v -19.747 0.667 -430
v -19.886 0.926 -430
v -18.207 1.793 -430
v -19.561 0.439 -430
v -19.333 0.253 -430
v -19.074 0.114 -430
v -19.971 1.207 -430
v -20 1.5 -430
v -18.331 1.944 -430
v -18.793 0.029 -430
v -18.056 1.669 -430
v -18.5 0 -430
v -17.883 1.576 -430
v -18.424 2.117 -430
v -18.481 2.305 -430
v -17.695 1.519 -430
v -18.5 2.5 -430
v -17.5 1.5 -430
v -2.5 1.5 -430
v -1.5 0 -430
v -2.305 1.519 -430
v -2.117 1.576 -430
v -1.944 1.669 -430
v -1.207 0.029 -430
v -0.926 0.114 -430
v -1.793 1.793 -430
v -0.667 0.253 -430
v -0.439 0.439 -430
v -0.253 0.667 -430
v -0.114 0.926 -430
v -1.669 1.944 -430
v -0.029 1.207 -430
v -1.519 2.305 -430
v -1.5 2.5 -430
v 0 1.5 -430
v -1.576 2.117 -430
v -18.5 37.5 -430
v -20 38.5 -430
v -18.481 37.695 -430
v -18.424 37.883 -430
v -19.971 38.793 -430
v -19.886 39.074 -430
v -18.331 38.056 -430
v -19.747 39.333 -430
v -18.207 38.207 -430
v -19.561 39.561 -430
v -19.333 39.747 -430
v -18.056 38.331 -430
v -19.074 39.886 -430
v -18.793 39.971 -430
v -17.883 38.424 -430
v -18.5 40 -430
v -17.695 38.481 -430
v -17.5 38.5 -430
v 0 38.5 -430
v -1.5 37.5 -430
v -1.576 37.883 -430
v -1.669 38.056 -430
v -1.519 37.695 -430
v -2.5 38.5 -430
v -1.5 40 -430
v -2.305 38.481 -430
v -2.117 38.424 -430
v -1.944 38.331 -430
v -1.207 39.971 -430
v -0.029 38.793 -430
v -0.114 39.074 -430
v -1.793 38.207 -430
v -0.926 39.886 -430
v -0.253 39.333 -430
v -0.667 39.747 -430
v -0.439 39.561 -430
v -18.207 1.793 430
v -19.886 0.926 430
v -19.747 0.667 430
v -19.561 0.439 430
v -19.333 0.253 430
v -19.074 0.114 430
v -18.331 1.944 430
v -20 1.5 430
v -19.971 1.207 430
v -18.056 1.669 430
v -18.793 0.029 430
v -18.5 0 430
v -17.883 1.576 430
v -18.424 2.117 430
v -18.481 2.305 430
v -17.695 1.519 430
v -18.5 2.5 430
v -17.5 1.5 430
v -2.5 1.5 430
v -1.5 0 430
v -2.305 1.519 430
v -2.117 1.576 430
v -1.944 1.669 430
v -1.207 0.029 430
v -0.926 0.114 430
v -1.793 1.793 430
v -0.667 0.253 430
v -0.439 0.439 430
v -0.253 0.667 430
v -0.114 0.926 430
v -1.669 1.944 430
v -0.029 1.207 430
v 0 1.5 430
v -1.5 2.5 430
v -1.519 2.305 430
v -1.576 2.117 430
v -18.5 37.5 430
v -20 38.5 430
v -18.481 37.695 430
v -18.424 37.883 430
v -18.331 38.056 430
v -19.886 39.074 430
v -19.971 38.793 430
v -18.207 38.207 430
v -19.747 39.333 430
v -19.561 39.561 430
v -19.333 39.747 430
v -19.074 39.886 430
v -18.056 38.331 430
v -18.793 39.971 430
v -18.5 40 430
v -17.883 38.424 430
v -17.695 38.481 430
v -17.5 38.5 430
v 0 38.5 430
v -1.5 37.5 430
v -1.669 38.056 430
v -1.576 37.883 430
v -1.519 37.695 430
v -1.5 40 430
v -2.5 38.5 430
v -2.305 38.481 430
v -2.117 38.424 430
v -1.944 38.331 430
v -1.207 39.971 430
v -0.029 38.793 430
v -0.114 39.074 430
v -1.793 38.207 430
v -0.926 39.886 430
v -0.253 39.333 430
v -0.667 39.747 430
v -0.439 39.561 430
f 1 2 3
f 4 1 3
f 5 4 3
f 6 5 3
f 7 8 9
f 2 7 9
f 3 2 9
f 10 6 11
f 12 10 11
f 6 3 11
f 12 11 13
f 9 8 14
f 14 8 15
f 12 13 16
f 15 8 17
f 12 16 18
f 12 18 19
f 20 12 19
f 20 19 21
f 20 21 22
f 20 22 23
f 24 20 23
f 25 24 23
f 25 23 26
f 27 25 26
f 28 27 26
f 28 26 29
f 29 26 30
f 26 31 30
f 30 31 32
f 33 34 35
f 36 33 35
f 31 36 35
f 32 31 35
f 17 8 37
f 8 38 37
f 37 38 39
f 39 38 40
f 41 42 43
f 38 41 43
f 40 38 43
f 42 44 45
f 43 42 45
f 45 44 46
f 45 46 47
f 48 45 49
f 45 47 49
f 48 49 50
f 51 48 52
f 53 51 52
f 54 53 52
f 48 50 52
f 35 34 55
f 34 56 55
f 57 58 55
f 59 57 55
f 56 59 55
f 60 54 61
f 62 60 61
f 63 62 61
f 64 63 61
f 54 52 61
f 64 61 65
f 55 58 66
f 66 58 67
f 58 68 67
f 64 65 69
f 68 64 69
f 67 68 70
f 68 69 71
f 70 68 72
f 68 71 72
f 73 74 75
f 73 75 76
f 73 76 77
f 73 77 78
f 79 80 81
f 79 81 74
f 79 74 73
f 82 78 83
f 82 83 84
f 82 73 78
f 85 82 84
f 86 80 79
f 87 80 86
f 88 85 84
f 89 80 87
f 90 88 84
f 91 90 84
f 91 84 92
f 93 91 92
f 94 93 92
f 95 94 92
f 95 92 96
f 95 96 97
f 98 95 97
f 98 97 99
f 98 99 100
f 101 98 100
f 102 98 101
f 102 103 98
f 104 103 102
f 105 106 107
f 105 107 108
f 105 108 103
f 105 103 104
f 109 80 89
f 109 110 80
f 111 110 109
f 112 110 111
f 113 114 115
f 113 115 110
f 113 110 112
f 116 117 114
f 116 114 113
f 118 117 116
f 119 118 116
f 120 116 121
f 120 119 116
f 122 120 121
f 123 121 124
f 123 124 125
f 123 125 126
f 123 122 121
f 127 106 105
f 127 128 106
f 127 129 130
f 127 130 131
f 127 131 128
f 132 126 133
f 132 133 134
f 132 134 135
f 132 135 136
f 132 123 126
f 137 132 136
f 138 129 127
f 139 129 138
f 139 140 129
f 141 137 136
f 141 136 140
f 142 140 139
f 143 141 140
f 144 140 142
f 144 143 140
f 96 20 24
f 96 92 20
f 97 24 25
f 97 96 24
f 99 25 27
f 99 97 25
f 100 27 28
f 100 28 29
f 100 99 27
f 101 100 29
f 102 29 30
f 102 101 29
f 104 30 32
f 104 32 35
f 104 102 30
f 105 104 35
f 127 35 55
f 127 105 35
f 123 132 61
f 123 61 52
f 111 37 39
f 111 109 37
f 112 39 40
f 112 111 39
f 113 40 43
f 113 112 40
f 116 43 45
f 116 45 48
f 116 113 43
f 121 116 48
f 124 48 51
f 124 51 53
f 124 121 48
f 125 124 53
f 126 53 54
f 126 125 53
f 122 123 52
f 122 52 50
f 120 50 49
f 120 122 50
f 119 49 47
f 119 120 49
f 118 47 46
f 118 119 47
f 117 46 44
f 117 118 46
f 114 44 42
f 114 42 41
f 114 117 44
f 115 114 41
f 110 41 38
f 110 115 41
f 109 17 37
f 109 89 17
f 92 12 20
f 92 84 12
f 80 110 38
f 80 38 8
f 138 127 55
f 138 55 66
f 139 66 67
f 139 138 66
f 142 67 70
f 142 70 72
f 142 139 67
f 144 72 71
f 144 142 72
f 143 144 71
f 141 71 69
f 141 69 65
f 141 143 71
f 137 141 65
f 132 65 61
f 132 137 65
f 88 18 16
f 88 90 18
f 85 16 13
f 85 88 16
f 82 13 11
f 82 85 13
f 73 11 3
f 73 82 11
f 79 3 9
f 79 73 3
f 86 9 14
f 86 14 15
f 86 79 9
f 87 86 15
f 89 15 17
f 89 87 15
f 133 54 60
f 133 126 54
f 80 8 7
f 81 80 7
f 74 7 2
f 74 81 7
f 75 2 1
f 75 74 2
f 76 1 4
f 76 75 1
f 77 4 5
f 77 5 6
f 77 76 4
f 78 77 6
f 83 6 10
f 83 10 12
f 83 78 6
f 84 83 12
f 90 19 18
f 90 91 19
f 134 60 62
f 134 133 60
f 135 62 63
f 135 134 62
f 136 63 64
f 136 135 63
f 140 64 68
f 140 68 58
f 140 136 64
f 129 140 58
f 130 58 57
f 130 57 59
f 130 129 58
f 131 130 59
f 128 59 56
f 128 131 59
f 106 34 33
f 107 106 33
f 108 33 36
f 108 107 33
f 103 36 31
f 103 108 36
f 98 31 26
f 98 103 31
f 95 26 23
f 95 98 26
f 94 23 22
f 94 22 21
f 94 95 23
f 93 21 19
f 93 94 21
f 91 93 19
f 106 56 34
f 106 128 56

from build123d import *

# Parameters (mm, degrees)
EXTRUDE_1_DEPTH = 430


# Read off the part's stored shape, not the designer's step: Бобышка-Вытянуть1
with BuildPart() as part:
    # Бобышка-Вытянуть1 outline → Бобышка-Вытянуть1 (new body)
    with BuildSketch(Plane.XY):
        with BuildLine():
            Line((0, 1.5), (0, 38.5))
            ThreePointArc((0, 38.5), (-0.439339828, 39.560660172), (-1.5, 40))
            Line((-1.5, 40), (-18.5, 40))
            ThreePointArc((-18.5, 40), (-19.560660172, 39.560660172), (-20, 38.5))
            Line((-20, 38.5), (-20, 1.5))
            ThreePointArc((-20, 1.5), (-19.560660172, 0.439339828), (-18.5, 0))
            Line((-18.5, 0), (-1.5, 0))
            ThreePointArc((-1.5, 0), (-0.439339828, 0.439339828), (0, 1.5))
        make_face()
        with BuildLine():
            ThreePointArc((-1.5, 2.5), (-1.792893219, 1.792893219), (-2.5, 1.5))
            Line((-2.5, 1.5), (-17.5, 1.5))
            ThreePointArc((-17.5, 1.5), (-18.207106781, 1.792893219), (-18.5, 2.5))
            Line((-18.5, 2.5), (-18.5, 37.5))
            ThreePointArc((-18.5, 37.5), (-18.207106781, 38.207106781), (-17.5, 38.5))
            Line((-17.5, 38.5), (-2.5, 38.5))
            ThreePointArc((-2.5, 38.5), (-1.792893219, 38.207106781), (-1.5, 37.5))
            Line((-1.5, 37.5), (-1.5, 2.5))
        make_face(mode=Mode.SUBTRACT)
    extrude(amount=EXTRUDE_1_DEPTH)

    # Зеркальное отражение1: part across plane


with BuildPart() as part_1:
    add(part.part)
    add(part.part.mirror(Plane(origin=(-1.5, 38.5, 0), x_dir=(1, 0, 0), z_dir=(0, 0, -1))))


solid = part_1.part
